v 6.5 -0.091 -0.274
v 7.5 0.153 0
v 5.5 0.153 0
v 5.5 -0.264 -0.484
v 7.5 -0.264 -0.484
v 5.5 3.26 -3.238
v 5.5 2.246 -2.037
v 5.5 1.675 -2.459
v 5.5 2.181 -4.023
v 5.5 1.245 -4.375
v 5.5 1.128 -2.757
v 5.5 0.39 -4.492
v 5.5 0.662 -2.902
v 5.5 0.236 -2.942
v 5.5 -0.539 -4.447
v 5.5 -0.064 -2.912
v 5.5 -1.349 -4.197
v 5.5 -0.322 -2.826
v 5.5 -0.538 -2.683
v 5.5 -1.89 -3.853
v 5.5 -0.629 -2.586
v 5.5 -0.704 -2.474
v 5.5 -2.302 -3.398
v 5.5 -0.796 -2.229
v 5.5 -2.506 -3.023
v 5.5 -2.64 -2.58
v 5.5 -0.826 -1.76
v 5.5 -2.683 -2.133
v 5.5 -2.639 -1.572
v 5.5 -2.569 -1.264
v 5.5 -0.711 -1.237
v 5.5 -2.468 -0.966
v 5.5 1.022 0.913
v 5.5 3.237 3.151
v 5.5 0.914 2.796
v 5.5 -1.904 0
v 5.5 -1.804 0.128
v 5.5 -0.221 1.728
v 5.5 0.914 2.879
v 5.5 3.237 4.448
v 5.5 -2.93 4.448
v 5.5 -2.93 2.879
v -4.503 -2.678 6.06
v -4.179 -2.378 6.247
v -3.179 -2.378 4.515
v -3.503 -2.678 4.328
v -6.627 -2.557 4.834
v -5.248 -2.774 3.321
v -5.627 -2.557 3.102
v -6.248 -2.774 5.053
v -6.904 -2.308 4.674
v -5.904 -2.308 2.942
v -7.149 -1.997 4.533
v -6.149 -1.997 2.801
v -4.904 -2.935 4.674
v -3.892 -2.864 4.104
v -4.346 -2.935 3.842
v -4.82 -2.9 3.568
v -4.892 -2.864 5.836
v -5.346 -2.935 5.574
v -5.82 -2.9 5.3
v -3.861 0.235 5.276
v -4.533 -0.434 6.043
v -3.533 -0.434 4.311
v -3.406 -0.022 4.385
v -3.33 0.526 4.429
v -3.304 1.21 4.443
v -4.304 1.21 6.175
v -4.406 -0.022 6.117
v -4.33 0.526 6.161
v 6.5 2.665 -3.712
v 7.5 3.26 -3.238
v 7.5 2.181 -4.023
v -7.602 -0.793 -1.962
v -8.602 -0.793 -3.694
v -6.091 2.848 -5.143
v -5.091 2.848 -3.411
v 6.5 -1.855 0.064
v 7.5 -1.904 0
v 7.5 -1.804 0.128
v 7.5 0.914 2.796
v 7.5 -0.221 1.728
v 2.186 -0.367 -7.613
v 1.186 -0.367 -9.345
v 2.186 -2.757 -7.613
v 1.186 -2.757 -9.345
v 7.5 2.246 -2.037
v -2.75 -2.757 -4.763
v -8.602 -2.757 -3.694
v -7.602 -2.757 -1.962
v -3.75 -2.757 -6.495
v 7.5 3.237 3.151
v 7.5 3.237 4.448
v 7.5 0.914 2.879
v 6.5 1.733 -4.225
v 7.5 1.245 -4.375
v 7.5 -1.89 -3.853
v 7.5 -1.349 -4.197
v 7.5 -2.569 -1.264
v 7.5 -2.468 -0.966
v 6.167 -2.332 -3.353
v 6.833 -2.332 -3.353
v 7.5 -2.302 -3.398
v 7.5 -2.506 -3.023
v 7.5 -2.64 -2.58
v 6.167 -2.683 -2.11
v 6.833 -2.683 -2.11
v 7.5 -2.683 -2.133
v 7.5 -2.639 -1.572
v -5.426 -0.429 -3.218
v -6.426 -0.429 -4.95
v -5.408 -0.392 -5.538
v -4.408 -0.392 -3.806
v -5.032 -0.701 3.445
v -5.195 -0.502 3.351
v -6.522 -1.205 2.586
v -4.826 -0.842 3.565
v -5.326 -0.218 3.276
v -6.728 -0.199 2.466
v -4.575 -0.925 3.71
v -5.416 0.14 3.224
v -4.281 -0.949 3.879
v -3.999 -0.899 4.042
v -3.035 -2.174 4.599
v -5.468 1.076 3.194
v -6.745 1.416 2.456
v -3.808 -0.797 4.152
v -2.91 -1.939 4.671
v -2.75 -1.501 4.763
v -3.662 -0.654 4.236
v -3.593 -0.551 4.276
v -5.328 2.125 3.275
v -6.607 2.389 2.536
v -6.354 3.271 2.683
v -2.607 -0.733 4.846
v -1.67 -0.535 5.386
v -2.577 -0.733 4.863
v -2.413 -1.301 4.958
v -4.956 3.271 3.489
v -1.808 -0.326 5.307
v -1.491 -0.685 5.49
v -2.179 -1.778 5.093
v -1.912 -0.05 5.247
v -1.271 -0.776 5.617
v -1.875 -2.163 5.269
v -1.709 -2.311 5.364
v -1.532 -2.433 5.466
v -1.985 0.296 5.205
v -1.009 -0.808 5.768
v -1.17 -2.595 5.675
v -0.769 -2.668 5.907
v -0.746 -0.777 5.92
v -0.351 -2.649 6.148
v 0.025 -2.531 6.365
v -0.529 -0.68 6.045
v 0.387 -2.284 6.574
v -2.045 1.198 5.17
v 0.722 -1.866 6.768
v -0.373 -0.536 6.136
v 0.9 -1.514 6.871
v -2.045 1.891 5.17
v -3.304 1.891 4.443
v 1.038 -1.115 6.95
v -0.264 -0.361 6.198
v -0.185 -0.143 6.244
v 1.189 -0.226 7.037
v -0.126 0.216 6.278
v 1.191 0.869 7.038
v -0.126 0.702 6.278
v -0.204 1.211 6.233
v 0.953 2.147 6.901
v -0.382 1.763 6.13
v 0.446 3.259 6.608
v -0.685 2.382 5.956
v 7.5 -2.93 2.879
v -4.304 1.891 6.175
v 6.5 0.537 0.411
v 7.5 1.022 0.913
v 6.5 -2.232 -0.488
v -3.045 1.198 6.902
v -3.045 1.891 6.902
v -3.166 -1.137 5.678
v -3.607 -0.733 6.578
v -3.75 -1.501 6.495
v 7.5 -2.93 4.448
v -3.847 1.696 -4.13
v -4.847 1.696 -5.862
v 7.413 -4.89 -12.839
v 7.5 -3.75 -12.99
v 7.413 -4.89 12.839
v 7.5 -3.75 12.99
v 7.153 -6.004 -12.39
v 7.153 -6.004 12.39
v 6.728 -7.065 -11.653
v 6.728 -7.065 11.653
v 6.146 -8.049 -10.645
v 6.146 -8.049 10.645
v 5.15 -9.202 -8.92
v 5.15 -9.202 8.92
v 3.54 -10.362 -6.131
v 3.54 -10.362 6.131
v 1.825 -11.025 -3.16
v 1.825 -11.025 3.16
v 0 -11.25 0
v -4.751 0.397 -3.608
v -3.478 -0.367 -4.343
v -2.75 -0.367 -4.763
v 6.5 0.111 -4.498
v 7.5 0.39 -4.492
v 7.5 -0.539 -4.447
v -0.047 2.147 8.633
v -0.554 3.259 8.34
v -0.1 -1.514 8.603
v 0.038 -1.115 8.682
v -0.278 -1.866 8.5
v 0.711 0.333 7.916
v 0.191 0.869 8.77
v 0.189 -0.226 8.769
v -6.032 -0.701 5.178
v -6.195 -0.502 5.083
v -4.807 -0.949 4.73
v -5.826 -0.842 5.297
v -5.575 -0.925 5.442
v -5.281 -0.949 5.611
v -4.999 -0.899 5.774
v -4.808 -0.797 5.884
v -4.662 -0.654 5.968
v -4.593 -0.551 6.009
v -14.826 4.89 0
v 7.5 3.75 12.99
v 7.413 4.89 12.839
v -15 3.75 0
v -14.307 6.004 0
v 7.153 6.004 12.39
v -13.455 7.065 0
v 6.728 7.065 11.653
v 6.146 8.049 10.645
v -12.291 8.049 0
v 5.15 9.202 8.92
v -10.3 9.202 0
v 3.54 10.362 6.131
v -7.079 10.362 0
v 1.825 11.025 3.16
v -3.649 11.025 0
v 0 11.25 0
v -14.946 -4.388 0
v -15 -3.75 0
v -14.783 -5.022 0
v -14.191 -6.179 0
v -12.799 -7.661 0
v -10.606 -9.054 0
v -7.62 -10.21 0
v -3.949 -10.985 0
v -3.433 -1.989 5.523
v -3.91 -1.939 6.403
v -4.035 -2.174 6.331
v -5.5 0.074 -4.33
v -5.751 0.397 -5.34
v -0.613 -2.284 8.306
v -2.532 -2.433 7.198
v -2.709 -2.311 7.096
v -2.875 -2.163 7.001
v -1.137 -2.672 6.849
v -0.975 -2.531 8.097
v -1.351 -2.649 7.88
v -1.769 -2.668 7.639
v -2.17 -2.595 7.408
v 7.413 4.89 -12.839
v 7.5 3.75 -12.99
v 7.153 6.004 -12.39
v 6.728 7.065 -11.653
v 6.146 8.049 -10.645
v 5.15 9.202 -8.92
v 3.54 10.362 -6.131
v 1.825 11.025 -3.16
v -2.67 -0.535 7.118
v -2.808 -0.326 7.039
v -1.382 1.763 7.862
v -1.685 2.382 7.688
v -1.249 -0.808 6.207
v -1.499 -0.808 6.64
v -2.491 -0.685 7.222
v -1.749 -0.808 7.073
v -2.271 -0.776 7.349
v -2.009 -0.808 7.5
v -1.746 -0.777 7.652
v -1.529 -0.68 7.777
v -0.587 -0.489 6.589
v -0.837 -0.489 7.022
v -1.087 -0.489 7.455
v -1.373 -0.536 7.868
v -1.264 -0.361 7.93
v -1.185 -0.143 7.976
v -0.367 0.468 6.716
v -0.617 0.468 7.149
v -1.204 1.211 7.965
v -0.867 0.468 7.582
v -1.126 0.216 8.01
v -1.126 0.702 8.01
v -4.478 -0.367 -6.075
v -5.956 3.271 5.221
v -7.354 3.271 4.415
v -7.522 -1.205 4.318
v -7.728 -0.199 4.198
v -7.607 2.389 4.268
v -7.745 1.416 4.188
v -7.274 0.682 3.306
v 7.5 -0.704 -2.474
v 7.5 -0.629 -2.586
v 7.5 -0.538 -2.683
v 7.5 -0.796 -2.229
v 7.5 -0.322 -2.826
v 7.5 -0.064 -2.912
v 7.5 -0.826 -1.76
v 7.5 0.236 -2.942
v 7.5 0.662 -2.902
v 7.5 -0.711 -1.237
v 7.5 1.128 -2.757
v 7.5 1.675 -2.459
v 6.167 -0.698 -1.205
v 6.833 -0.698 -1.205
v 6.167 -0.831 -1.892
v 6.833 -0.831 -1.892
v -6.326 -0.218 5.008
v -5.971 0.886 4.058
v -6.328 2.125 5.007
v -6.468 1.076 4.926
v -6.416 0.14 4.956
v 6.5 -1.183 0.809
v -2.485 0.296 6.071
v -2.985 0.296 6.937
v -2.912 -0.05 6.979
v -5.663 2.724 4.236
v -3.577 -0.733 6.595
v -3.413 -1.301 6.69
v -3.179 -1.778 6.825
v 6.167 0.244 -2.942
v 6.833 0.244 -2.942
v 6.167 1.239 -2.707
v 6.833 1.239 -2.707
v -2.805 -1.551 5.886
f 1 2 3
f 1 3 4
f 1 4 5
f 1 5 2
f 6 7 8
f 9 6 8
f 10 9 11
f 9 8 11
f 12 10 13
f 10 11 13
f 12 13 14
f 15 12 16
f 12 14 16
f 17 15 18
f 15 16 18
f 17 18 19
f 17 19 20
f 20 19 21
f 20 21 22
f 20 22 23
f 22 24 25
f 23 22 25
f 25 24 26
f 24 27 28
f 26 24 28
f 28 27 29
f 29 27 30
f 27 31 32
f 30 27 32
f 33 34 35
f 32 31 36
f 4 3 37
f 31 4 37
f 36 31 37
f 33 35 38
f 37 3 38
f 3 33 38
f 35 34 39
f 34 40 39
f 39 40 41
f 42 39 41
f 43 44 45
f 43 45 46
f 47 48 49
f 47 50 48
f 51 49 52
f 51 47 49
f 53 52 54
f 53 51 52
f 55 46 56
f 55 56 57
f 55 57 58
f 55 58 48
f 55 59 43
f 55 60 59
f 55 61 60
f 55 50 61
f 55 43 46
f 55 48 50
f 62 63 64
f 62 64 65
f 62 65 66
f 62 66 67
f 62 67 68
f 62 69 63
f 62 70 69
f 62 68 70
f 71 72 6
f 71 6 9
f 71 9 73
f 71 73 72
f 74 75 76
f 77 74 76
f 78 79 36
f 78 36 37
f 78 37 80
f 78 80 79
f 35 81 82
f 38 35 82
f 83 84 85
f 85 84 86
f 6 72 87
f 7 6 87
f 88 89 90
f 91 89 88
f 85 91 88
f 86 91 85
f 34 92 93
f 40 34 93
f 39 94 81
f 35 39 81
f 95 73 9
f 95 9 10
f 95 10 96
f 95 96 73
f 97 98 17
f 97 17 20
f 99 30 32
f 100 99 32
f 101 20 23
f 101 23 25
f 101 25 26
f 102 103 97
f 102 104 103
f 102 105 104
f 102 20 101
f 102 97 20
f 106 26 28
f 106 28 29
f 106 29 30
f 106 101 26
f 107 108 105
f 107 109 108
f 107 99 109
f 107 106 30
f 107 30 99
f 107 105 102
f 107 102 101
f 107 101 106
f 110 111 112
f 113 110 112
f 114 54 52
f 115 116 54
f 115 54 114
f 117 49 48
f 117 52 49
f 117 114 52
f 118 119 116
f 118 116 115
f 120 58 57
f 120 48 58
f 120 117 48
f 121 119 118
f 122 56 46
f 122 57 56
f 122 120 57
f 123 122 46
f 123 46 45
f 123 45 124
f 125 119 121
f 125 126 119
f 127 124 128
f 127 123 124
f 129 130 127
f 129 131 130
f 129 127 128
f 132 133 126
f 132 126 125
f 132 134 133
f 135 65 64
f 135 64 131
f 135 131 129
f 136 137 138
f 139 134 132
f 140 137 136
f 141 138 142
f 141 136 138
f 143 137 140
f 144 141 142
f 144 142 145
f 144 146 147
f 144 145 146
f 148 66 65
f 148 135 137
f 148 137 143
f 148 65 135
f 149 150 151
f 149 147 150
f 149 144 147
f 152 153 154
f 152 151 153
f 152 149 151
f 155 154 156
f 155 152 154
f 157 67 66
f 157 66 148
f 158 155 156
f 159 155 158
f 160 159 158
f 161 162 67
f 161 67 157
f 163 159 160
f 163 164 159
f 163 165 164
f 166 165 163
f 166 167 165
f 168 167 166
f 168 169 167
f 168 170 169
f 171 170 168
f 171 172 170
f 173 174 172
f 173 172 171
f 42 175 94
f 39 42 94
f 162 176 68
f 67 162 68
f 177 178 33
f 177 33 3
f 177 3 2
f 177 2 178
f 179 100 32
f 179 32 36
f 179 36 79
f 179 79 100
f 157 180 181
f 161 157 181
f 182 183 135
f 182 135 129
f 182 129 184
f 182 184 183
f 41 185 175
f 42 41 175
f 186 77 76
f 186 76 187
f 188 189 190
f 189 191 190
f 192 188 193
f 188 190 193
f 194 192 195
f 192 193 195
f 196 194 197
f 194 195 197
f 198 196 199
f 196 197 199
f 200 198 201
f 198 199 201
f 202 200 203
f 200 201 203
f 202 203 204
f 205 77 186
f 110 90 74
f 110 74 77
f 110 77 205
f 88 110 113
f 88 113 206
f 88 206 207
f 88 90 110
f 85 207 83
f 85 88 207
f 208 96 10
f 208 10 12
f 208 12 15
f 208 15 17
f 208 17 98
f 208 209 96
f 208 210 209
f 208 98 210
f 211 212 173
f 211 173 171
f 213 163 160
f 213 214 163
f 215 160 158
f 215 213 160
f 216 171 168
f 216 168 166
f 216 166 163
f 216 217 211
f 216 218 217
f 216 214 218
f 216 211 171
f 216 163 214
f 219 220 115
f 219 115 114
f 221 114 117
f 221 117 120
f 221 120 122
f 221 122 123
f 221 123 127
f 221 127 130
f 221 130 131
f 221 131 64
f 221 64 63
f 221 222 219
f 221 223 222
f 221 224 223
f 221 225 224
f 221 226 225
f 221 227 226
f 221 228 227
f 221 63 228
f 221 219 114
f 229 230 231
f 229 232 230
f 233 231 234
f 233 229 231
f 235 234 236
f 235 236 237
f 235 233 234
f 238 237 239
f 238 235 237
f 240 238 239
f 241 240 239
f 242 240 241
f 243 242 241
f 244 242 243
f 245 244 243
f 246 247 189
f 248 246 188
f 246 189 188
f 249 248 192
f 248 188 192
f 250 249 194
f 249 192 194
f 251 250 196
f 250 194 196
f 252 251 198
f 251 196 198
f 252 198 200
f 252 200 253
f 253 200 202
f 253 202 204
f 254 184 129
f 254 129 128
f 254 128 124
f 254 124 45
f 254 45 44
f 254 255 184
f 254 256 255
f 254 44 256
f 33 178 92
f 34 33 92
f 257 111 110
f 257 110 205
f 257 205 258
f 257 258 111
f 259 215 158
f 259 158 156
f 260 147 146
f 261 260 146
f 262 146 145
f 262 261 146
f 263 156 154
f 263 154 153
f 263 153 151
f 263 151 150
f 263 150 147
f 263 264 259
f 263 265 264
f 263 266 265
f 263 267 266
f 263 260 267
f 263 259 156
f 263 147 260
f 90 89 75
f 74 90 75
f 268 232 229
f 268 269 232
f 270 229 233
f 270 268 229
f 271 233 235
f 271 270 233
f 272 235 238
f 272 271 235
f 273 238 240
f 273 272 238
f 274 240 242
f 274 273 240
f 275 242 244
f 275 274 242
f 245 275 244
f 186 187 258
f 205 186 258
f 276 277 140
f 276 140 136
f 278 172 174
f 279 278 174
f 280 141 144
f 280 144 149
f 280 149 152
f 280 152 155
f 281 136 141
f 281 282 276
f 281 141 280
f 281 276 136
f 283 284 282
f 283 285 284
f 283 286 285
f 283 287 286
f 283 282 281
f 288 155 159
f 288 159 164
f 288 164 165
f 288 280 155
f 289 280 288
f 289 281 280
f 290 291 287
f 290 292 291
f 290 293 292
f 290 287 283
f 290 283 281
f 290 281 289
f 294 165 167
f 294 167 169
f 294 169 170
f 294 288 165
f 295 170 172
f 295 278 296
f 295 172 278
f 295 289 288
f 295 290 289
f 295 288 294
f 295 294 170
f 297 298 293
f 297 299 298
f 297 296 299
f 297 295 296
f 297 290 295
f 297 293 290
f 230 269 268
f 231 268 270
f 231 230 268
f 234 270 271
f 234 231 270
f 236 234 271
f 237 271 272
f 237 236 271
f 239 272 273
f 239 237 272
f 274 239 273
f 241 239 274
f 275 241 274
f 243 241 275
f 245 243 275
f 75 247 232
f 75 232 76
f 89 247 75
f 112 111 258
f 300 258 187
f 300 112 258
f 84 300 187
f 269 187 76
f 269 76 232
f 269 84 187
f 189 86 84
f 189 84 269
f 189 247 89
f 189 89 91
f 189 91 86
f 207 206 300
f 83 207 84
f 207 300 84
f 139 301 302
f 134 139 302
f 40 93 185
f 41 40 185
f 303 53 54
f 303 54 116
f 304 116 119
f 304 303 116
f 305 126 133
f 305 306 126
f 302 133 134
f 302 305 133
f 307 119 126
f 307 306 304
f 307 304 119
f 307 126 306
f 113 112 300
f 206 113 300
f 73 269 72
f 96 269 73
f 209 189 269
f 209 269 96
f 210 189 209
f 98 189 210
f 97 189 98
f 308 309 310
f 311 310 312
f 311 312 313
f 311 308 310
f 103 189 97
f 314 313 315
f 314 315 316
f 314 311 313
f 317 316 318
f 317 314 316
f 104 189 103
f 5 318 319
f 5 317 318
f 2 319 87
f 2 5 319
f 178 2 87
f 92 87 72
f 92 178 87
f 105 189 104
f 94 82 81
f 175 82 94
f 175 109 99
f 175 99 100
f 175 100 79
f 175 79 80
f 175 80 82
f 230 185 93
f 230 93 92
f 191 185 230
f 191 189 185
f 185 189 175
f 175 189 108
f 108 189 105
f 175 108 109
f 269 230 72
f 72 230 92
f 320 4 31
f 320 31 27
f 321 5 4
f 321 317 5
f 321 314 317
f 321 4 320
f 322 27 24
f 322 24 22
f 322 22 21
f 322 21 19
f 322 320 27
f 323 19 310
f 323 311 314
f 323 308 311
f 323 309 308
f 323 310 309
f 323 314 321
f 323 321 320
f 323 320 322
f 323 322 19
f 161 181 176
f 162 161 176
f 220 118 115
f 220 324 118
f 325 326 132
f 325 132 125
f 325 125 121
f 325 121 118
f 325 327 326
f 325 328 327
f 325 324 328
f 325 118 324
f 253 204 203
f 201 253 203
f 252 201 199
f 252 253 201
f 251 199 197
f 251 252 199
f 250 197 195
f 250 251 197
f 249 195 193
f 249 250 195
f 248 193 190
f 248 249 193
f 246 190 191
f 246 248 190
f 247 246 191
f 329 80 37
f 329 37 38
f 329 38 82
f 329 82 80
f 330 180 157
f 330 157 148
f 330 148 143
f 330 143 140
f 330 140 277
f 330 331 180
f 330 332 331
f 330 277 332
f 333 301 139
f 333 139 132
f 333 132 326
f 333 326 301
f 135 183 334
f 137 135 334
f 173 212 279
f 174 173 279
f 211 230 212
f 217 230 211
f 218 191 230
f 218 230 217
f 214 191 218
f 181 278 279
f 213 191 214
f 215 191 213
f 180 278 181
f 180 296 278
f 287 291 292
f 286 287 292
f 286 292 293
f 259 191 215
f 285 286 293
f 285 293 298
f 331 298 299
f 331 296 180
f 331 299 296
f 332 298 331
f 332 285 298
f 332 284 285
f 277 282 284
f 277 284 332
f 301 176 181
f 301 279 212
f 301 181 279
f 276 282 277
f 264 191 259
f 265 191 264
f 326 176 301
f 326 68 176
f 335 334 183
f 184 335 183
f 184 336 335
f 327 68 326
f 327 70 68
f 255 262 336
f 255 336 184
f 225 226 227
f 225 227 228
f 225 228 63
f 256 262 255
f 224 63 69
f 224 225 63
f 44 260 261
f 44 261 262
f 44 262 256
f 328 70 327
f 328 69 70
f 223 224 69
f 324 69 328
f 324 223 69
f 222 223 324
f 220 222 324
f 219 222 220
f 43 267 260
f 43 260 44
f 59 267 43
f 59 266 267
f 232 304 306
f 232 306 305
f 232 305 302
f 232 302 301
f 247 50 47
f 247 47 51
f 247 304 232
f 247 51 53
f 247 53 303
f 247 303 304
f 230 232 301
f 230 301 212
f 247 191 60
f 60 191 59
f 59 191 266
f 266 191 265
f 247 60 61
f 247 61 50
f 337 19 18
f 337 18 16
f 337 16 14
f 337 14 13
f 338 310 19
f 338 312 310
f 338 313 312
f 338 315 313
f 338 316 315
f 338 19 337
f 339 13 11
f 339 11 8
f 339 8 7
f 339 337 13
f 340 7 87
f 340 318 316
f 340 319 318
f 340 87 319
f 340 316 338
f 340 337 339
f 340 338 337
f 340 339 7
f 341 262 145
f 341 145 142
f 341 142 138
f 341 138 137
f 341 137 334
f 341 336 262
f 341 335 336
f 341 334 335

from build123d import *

# Parameters (mm, degrees)
F1_DEPTH      = 11.25
F1_DEPTH_BACK = 11.25
F2_R          = 7.49999
F3_W          = 5.6993120345
F3_H          = 2.3895553061
F6_DEPTH      = 2
F7_DEPTH      = 2
F8_DEPTH      = 2


# Not quite as in the source:
# - a fillet or chamfer is up to 0.001 mm smaller than in the source, because OpenCascade refuses the exact size


with BuildPart() as f1:
    # F0 (on Front) → F1 (new body, two sides)
    with BuildSketch(Plane.XZ) as f1_sk:
        Polygon((7.5, -12.9903810568), (7.5, 12.9903810568), (-15, 0), align=None)
    extrude(amount=F1_DEPTH)
    extrude(f1_sk.sketch, amount=-F1_DEPTH_BACK)

    # F2 (radius 7.5 in the source; OpenCascade refuses exactly that, so slightly less here)
    f2_edges = [f1.edges().sort_by_distance(p)[0] for p in [
        (7.5, 11.25, 0),
        (-3.75, 11.25, 6.495191),
        (-3.75, 11.25, -6.495191),
        (7.5, -11.25, 0),
        (-3.75, -11.25, 6.495191),
        (-3.75, -11.25, -6.495191),
    ]]
    fillet(f2_edges, radius=F2_R)

    # F3 (on face) → F6 (cut)
    with BuildSketch(Plane(origin=(-3.75, 0, -6.4951905284), x_dir=(0.8660254038, 0, -0.5), z_dir=(-0.5, 0, -0.8660254038))):
        with Locations((2.8496560172, 1.562116124)):
            Rectangle(F3_W, F3_H)
        with BuildLine():
            Line((-0.8410443106, 0.367338471), (0, 0.367338471))
            Line((0, 0.367338471), (0, 2.7568937771))
            Line((0, 2.7568937771), (-5.6028393047, 2.7568937771))
            Line((-5.6028393047, 2.7568937771), (-5.6028393047, 0.7928079458))
            Line((-5.6028393047, 0.7928079458), (-2.7037100927, -2.8484191874))
            Line((-2.7037100927, -2.8484191874), (-1.2665137854, -1.6956937498))
            Line((-1.2665137854, -1.6956937498), (-2.3103981945, -0.3970223878))
            add(Edge.make_bspline(
                [(-3.0896010117, 0.4291799644), (-2.4959226748, -0.1644983725), (-2.3103981945, -0.3970223878)],
                knots=[0, 0, 0, 1, 1, 1], degree=2))
            Line((-3.0896010117, 0.4291799644), (-1.9146126366, 0.3920750683))
            Line((-1.9146126366, 0.3920750683), (-0.8410443106, 0.367338471))
        make_face()
    extrude(amount=-F6_DEPTH, mode=Mode.SUBTRACT)

    # F4 (on face) → F7 (cut)
    with BuildSketch(Plane.YZ.offset(7.5)):
        with BuildLine():
            add(Edge.make_bspline(
                [(0.1534139825, 0), (-0.1261569639, -0.3061831776), (-0.2635343428, -0.4836289588)],
                knots=[0.5438727063, 0.5438727063, 0.5438727063, 1, 1, 1], degree=2))
            Line((0.1534139825, 0), (-1.9043553856, 0))
            add(Edge.make_bspline(
                [(-2.4683418116, -0.9662925903), (-2.2786358022, -0.49373663), (-1.9043553856, 0)],
                knots=[0, 0, 0, 0.8852247383, 0.8852247383, 0.8852247383], degree=2))
            add(Edge.make_bspline(
                [(-2.682644464, -2.110205397), (-2.682644464, -1.5001185668), (-2.4683418116, -0.9662925903)],
                knots=[0, 0, 0, 1, 1, 1], degree=2))
            add(Edge.make_bspline(
                [(-2.3322306675, -3.3525815846), (-2.682644464, -2.8091023355), (-2.682644464, -2.110205397)],
                knots=[0, 0, 0, 1, 1, 1], degree=2))
            add(Edge.make_bspline(
                [(-1.3485621865, -4.1972429397), (-1.981816871, -3.8960608337), (-2.3322306675, -3.3525815846)],
                knots=[0, 0, 0, 1, 1, 1], degree=2))
            add(Edge.make_bspline(
                [(0.1110126353, -4.4984250458), (-0.7153075019, -4.4984250458), (-1.3485621865, -4.1972429397)],
                knots=[0, 0, 0, 1, 1, 1], degree=2))
            add(Edge.make_bspline(
                [(1.2452721693, -4.3748631562), (0.7384753562, -4.4984250458), (0.1110126353, -4.4984250458)],
                knots=[0, 0, 0, 1, 1, 1], degree=2))
            add(Edge.make_bspline(
                [(2.1806742872, -4.0225187051), (1.7520689824, -4.2513012665), (1.2452721693, -4.3748631562)],
                knots=[0, 0, 0, 1, 1, 1], degree=2))
            add(Edge.make_bspline(
                [(3.2599101673, -3.2377076403), (2.609279592, -3.7937361438), (2.1806742872, -4.0225187051)],
                knots=[0, 0, 0, 1, 1, 1], degree=2))
            Line((3.2599101673, -3.2377076403), (2.2463165411, -2.036840525))
            add(Edge.make_bspline(
                [(1.2385148785, -2.7067776456), (1.72117851, -2.4712377934), (2.2463165411, -2.036840525)],
                knots=[0, 0, 0, 1, 1, 1], degree=2))
            add(Edge.make_bspline(
                [(0.2442277976, -2.9423174978), (0.755851247, -2.9423174978), (1.2385148785, -2.7067776456)],
                knots=[0, 0, 0, 1, 1, 1], degree=2))
            add(Edge.make_bspline(
                [(-0.5376872855, -2.682644464), (-0.2442277976, -2.9423174978), (0.2442277976, -2.9423174978)],
                knots=[0, 0, 0, 1, 1, 1], degree=2))
            add(Edge.make_bspline(
                [(-0.8311467735, -1.8920414356), (-0.8311467735, -2.4229714303), (-0.5376872855, -2.682644464)],
                knots=[0, 0, 0, 1, 1, 1], degree=2))
            add(Edge.make_bspline(
                [(-0.6979316112, -1.2047284243), (-0.8311467735, -1.5368010028), (-0.8311467735, -1.8920414356)],
                knots=[0, 0, 0, 1, 1, 1], degree=2))
            add(Edge.make_bspline(
                [(-0.2635343428, -0.4836289588), (-0.5647164489, -0.8726558458), (-0.6979316112, -1.2047284243)],
                knots=[0, 0, 0, 1, 1, 1], degree=2))
        make_face()
        with BuildLine():
            Line((-1.9043553856, 0), (0.1534139825, 0))
            add(Edge.make_bspline(
                [(1.0222815716, 0.9131995908), (0.4867661175, 0.3650837732), (0.1534139825, 0)],
                knots=[0, 0, 0, 0.5438727063, 0.5438727063, 0.5438727063], degree=2))
            Line((1.0222815716, 0.9131995908), (3.236742313, 3.1508281866))
            Line((3.236742313, 3.1508281866), (3.236742313, 4.4482280281))
            Line((3.236742313, 4.4482280281), (-2.9297682434, 4.4482280281))
            Line((-2.9297682434, 4.4482280281), (-2.9297682434, 2.8786058984))
            Line((-2.9297682434, 2.8786058984), (0.9141649181, 2.8786058984))
            Line((0.9141649181, 2.8786058984), (0.9141649181, 2.7955877538))
            Line((0.9141649181, 2.7955877538), (-0.2210599432, 1.7279358009))
            add(Edge.make_bspline(
                [(-1.8041966546, 0.128388526), (-1.3543541501, 0.6892436658), (-0.2210599432, 1.7279358009)],
                knots=[0, 0, 0, 1, 1, 1], degree=2))
            add(Edge.make_bspline(
                [(-1.9043553856, 0), (-1.8558274458, 0.0640162305), (-1.8041966546, 0.128388526)],
                knots=[0.8852247383, 0.8852247383, 0.8852247383, 1, 1, 1], degree=2))
        make_face()
    extrude(amount=-F7_DEPTH, mode=Mode.SUBTRACT)

    # F5 (on face) → F8 (cut)
    with BuildSketch(Plane(origin=(-3.75, 0, 6.4951905284), x_dir=(0.8660254038, 0, 0.5), z_dir=(-0.5, 0, 0.8660254038))):
        with BuildLine():
            Line((0.8145773358, 1.8911934049), (0, 1.8911934049))
            Line((0, 1.8911934049), (0, 0))
            Line((0, 0), (0, -1.5006215977))
            add(Edge.make_bspline(
                [(0.1648783041, -0.7331196022), (0.1120638425, -1.1571661487), (0, -1.5006215977)],
                knots=[0, 0, 0, 0.3899595317, 0.3899595317, 0.3899595317], degree=2))
            Line((0.1648783041, -0.7331196022), (0.2002093693, -0.7331196022))
            add(Edge.make_bspline(
                [(1.0108610311, -2.163046323), (0.422009945, -1.6536901335), (0.2002093693, -0.7331196022)],
                knots=[0, 0, 0, 1, 1, 1], degree=2))
            add(Edge.make_bspline(
                [(2.4398063334, -2.6724025124), (1.5997121172, -2.6724025124), (1.0108610311, -2.163046323)],
                knots=[0, 0, 0, 1, 1, 1], degree=2))
            add(Edge.make_bspline(
                [(4.0090944779, -1.8656765245), (3.4447788537, -2.6724025124), (2.4398063334, -2.6724025124)],
                knots=[0, 0, 0, 1, 1, 1], degree=2))
            add(Edge.make_bspline(
                [(4.5734101021, 0.3327008636), (4.5734101021, -1.0589505365), (4.0090944779, -1.8656765245)],
                knots=[0, 0, 0, 1, 1, 1], degree=2))
            add(Edge.make_bspline(
                [(3.6901334729, 3.2592907616), (4.5734101021, 2.0325176655), (4.5734101021, 0.3327008636)],
                knots=[0, 0, 0, 1, 1, 1], degree=2))
            Line((3.6901334729, 3.2592907616), (2.3848468987, 2.3819026433))
            add(Edge.make_bspline(
                [(2.8932216697, 1.3671159382), (2.7460088982, 1.8244569484), (2.3848468987, 2.3819026433)],
                knots=[0, 0, 0, 1, 1, 1], degree=2))
            add(Edge.make_bspline(
                [(3.0404344412, 0.4681366135), (3.0404344412, 0.909774928), (2.8932216697, 1.3671159382)],
                knots=[0, 0, 0, 1, 1, 1], degree=2))
            add(Edge.make_bspline(
                [(2.0217220623, -0.8077074064), (3.0404344412, -0.8077074064), (3.0404344412, 0.4681366135)],
                knots=[0, 0, 0, 1, 1, 1], degree=2))
            add(Edge.make_bspline(
                [(1.0874116723, -0.3258309343), (1.3602460089, -0.8077074064), (2.0217220623, -0.8077074064)],
                knots=[0, 0, 0, 1, 1, 1], degree=2))
            add(Edge.make_bspline(
                [(0.8145773358, 1.1983119602), (0.8145773358, 0.1560455378), (1.0874116723, -0.3258309343)],
                knots=[0, 0, 0, 1, 1, 1], degree=2))
            Line((0.8145773358, 1.1983119602), (0.8145773358, 1.8911934049))
        make_face()
        with BuildLine():
            Line((0, 0), (0, 1.8911934049))
            Line((0, 1.8911934049), (-0.6398848469, 1.8911934049))
            Line((-0.6398848469, 1.8911934049), (-0.6398848469, 1.2100889819))
            add(Edge.make_bspline(
                [(-0.9038864172, -0.4337869668), (-0.6398848469, 0.0814577336), (-0.6398848469, 1.2100889819)],
                knots=[0, 0, 0, 1, 1, 1], degree=2))
            add(Edge.make_bspline(
                [(-1.7979586496, -0.9490316671), (-1.1678879874, -0.9490316671), (-0.9038864172, -0.4337869668)],
                knots=[0, 0, 0, 1, 1, 1], degree=2))
            add(Edge.make_bspline(
                [(-2.8235409579, -0.5015048417), (-2.5045799529, -0.9490316671), (-1.7979586496, -0.9490316671)],
                knots=[0, 0, 0, 1, 1, 1], degree=2))
            add(Edge.make_bspline(
                [(-3.1425019628, 0.8862208846), (-3.1425019628, -0.0539780162), (-2.8235409579, -0.5015048417)],
                knots=[0, 0, 0, 1, 1, 1], degree=2))
            add(Edge.make_bspline(
                [(-2.9766422403, 2.1247710024), (-3.1425019628, 1.4986260141), (-3.1425019628, 0.8862208846)],
                knots=[0, 0, 0, 1, 1, 1], degree=2))
            add(Edge.make_bspline(
                [(-2.5477623659, 3.2710677833), (-2.8107825177, 2.7509159906), (-2.9766422403, 2.1247710024)],
                knots=[0, 0, 0, 1, 1, 1], degree=2))
            Line((-2.5477623659, 3.2710677833), (-4.1612143418, 3.2710677833))
            add(Edge.make_bspline(
                [(-4.6460350694, 0.6820858414), (-4.6460350694, 2.1424365349), (-4.1612143418, 3.2710677833)],
                knots=[0, 0, 0, 1, 1, 1], degree=2))
            add(Edge.make_bspline(
                [(-3.9246924889, -1.9971866004), (-4.6460350694, -1.0589505365), (-4.6460350694, 0.6820858414)],
                knots=[0, 0, 0, 1, 1, 1], degree=2))
            add(Edge.make_bspline(
                [(-1.9098403559, -2.9354226642), (-3.2033499084, -2.9354226642), (-3.9246924889, -1.9971866004)],
                knots=[0, 0, 0, 1, 1, 1], degree=2))
            add(Edge.make_bspline(
                [(-0.4956163308, -2.3779769694), (-1.0206752159, -2.9354226642), (-1.9098403559, -2.9354226642)],
                knots=[0, 0, 0, 1, 1, 1], degree=2))
            add(Edge.make_bspline(
                [(0, -1.5006215977), (-0.1753091627, -2.0379125367), (-0.4956163308, -2.3779769694)],
                knots=[0.3899595317, 0.3899595317, 0.3899595317, 1, 1, 1], degree=2))
            Line((0, -1.5006215977), (0, 0))
        make_face()
    extrude(amount=-F8_DEPTH, mode=Mode.SUBTRACT)


solid = f1.part
